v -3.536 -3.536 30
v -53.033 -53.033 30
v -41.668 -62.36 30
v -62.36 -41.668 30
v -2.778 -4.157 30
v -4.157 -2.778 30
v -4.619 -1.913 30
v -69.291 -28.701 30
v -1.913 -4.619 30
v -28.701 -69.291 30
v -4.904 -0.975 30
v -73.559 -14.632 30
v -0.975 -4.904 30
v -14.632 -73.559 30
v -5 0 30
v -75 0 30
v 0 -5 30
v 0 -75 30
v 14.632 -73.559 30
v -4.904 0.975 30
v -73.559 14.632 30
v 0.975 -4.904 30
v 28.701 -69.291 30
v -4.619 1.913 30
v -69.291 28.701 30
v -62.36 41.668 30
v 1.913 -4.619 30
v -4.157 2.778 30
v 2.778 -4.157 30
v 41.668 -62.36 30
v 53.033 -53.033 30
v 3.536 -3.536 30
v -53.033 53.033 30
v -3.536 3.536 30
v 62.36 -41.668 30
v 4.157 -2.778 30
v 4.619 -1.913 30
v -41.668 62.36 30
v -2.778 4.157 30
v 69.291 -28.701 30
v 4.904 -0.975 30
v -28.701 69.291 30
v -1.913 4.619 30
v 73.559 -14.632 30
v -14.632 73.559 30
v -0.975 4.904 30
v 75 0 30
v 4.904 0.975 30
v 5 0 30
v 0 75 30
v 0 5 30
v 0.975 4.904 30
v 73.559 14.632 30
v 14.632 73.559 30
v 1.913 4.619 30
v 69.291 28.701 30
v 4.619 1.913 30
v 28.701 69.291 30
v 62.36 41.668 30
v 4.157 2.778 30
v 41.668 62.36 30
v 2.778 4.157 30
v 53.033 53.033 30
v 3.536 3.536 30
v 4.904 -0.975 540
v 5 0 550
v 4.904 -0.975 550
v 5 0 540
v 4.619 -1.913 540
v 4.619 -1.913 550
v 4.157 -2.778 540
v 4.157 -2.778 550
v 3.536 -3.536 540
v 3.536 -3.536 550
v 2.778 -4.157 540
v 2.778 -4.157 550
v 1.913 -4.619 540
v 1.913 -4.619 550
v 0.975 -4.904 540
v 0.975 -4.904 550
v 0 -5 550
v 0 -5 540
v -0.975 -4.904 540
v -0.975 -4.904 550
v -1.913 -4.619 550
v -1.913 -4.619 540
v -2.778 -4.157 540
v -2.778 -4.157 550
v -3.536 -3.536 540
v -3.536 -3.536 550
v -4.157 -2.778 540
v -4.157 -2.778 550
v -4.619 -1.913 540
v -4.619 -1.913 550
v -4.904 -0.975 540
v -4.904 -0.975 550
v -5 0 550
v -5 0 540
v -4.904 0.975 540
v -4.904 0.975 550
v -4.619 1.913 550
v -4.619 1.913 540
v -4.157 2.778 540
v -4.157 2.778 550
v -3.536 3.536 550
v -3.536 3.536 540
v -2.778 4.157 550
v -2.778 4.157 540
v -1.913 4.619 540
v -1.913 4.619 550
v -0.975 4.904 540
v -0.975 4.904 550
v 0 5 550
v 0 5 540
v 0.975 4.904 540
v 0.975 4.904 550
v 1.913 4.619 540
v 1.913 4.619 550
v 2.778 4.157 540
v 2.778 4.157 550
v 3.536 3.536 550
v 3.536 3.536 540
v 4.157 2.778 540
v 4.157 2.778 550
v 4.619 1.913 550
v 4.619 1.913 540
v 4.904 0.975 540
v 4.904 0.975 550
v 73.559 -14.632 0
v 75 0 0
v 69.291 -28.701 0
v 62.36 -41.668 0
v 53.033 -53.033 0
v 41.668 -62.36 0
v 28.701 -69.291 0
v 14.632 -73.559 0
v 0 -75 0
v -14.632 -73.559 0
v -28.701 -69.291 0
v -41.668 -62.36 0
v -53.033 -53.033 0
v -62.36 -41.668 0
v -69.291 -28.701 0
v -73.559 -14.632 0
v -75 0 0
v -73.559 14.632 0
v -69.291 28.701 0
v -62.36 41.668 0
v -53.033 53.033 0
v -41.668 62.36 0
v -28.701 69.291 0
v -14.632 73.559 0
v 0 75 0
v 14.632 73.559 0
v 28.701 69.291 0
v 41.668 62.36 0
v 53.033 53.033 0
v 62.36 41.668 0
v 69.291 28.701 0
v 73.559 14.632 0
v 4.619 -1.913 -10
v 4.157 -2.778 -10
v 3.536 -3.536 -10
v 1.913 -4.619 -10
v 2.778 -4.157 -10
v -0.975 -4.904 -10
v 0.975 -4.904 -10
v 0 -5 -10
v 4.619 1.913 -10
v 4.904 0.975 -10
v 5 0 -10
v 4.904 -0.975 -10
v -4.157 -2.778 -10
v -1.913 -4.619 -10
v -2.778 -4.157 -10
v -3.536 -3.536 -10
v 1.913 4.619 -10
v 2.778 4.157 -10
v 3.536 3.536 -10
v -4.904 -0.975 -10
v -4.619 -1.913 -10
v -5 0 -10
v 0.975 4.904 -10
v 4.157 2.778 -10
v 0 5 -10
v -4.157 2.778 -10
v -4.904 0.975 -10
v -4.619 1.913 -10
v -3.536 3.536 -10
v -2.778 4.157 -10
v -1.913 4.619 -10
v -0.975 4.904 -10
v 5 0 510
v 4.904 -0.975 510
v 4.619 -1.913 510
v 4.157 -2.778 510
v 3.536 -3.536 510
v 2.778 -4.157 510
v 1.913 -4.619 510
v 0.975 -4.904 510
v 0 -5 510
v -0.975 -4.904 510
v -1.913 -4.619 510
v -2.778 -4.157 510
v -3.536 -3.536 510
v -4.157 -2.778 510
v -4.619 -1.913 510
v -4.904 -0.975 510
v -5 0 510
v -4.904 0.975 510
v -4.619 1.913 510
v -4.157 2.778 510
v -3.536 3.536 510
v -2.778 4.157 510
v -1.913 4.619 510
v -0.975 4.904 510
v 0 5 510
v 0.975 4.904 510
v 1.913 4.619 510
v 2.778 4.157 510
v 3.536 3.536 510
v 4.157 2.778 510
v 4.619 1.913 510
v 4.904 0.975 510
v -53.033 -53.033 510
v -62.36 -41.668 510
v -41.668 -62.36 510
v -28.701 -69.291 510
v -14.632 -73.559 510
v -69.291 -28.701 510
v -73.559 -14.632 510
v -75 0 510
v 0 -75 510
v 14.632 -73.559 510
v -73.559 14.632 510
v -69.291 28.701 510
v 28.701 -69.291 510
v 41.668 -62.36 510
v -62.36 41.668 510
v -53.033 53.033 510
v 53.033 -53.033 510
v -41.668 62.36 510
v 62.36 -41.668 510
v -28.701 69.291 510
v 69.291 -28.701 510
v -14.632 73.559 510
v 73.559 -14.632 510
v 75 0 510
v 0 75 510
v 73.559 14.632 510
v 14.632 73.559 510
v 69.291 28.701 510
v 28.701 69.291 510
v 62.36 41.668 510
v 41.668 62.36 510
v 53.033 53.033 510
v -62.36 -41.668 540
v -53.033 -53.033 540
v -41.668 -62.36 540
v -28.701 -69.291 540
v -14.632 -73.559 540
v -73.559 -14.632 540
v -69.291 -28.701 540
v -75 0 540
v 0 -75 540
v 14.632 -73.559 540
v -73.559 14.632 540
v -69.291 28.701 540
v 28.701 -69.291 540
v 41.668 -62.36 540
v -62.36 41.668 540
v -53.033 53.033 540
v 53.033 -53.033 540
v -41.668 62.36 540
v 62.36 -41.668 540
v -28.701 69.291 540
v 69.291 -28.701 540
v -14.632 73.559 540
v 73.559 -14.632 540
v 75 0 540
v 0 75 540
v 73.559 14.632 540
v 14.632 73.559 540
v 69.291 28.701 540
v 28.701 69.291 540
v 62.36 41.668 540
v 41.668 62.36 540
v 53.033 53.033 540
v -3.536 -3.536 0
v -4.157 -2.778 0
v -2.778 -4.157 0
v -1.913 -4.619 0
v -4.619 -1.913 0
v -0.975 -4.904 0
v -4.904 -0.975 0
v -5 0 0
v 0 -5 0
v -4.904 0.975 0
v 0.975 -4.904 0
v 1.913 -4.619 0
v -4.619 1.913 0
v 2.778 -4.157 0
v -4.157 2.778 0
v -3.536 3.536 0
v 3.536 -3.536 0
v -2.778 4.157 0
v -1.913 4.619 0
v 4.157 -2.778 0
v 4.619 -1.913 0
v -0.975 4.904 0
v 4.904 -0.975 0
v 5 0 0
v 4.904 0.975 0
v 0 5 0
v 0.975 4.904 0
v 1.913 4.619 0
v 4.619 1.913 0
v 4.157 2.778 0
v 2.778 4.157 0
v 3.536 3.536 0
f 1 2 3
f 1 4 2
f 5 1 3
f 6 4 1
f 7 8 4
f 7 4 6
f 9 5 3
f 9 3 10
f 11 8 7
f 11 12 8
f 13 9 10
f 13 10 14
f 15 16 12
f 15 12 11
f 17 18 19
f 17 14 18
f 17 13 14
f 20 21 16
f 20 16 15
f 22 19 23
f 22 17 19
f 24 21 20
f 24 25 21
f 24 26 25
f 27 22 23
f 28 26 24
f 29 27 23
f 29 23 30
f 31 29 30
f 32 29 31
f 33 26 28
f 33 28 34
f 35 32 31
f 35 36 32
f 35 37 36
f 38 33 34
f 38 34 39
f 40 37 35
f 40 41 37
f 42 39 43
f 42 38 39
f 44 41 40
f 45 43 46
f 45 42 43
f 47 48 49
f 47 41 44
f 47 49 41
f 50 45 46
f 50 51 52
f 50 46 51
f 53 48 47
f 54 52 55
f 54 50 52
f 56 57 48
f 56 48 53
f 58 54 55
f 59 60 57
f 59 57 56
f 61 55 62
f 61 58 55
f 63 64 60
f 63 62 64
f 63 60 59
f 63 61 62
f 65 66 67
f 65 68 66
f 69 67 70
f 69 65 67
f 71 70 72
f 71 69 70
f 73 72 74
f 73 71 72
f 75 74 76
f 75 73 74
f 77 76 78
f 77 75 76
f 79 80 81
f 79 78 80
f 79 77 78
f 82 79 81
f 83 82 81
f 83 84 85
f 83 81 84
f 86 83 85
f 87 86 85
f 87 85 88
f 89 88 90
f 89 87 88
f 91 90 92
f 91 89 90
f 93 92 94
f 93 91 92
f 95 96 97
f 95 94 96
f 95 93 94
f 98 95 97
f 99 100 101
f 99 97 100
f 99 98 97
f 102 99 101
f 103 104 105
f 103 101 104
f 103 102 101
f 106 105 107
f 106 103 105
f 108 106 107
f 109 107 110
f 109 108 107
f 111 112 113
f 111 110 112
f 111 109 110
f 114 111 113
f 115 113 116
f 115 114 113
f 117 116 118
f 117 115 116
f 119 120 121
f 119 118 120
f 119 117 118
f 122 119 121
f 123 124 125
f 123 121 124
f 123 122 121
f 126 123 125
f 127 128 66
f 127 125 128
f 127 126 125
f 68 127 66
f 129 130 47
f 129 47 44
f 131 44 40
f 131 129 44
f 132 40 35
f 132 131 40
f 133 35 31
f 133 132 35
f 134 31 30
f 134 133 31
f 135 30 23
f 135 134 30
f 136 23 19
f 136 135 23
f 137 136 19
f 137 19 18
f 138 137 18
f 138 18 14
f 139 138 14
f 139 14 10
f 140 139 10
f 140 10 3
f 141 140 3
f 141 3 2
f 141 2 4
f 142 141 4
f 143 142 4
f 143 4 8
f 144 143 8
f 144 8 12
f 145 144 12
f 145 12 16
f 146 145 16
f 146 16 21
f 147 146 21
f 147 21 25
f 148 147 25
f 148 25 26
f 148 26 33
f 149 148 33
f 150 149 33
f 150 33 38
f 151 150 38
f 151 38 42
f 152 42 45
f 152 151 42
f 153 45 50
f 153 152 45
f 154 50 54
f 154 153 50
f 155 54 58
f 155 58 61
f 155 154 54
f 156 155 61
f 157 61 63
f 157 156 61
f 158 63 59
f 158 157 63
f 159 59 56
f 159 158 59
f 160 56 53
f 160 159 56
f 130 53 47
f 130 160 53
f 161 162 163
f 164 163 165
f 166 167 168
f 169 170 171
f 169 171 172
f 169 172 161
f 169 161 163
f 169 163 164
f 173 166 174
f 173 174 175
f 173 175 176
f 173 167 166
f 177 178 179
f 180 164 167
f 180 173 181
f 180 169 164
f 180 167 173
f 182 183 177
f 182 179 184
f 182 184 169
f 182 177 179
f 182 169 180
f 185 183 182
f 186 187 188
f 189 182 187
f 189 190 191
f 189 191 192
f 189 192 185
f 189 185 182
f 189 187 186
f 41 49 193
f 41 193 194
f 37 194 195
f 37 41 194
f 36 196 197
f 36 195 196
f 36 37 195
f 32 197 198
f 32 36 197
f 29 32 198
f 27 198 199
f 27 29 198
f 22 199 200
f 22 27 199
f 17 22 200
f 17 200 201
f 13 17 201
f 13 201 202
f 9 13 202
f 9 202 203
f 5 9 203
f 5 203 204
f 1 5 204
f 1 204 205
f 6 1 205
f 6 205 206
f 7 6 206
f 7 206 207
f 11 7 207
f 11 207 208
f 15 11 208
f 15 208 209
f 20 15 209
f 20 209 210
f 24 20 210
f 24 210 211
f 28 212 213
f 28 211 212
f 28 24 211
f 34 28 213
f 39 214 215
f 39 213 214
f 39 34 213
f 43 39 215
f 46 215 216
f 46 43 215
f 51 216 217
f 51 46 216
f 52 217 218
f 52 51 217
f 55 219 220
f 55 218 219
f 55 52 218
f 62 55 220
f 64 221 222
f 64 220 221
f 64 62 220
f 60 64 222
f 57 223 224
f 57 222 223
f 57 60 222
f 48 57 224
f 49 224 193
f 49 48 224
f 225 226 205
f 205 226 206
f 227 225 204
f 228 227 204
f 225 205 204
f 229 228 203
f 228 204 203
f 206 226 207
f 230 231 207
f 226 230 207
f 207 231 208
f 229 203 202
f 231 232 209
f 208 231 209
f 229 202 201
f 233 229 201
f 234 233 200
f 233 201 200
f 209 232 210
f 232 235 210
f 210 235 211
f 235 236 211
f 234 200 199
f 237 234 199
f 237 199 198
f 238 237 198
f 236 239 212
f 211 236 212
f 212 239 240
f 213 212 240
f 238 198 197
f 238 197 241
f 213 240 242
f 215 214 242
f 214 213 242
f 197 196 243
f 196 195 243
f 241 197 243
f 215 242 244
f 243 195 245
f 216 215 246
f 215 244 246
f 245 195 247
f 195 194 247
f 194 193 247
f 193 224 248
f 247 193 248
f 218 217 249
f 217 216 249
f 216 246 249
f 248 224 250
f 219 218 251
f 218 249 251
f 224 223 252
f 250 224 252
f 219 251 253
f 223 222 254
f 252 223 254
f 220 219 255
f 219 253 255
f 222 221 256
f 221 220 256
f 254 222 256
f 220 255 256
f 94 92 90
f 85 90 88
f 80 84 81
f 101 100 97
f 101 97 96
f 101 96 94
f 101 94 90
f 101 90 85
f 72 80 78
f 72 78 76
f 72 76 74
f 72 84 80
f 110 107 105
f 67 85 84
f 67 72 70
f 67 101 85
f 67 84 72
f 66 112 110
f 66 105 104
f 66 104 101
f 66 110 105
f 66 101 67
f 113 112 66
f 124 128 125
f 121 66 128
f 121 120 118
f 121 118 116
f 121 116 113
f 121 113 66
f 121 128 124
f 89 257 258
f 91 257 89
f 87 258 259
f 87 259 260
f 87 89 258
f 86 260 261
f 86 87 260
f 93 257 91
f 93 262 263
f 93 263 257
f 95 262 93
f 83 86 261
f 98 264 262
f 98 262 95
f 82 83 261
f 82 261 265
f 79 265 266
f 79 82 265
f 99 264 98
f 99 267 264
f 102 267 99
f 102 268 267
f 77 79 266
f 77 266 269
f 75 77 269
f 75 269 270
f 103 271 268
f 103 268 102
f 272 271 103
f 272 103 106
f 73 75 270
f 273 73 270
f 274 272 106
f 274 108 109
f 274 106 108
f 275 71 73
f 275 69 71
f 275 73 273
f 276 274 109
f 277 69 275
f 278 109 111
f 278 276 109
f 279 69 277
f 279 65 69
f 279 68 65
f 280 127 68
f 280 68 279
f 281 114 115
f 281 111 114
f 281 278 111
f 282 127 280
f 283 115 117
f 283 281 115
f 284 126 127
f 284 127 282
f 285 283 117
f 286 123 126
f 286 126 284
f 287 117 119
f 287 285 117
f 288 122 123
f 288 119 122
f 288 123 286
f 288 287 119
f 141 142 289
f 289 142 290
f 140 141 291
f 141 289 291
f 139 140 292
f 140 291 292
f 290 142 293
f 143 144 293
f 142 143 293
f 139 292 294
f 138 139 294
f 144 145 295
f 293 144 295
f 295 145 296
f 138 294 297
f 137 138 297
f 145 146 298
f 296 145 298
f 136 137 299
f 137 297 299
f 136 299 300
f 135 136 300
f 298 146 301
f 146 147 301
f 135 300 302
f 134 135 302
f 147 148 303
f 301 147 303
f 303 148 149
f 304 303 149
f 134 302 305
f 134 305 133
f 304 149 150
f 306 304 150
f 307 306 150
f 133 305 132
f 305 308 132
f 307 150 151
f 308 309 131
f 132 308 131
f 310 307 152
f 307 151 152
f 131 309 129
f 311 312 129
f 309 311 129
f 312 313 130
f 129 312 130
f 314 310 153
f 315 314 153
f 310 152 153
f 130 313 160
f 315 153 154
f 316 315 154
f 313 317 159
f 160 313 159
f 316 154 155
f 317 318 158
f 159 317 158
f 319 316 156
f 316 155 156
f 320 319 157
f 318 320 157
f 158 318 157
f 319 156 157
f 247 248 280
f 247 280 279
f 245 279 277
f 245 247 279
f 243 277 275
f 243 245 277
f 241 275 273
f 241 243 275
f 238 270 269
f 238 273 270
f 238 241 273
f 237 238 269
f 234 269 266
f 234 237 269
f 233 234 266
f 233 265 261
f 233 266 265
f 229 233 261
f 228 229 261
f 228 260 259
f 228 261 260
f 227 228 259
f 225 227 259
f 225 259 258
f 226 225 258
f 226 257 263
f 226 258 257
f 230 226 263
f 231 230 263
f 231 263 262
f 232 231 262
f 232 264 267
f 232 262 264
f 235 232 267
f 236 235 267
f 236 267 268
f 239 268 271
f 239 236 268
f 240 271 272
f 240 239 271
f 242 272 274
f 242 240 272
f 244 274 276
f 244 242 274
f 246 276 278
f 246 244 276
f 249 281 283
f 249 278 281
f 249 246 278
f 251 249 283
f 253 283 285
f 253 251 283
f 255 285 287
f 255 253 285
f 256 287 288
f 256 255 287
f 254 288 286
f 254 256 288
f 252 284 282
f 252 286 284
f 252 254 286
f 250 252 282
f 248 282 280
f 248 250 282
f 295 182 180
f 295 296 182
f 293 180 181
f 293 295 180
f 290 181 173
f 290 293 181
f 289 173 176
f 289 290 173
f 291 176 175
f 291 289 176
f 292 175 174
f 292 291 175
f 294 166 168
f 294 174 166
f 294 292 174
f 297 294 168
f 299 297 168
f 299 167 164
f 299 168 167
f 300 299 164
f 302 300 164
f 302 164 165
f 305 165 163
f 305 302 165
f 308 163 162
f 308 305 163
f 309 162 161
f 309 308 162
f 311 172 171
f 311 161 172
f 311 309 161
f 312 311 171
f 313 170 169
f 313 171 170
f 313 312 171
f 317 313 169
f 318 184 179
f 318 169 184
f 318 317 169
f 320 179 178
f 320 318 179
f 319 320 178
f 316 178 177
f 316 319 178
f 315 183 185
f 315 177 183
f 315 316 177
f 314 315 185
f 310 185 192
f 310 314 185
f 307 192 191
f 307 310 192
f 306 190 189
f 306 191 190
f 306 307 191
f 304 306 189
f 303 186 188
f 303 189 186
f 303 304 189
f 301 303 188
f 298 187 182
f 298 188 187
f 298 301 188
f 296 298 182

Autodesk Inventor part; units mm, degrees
ref_plane "YZ Plane" through (0, 0, 0) normal (1, 0, 0) x (0, 1, 0)
ref_plane "XZ Plane" through (0, 0, 0) normal (0, 1, 0) x (-1, 0, 0)
ref_plane "XY Plane" through (0, 0, 0) normal (0, 0, 1) x (1, 0, 0)
sketch "Skizze1" plane through (0, 0, 0) normal (0, 0, 1) x (1, 0, 0)
  line L0 (-105, 0) -> (105, 0) projected
  line L1 (0, -105) -> (0, 105) projected
  circle A0 centre (0, 0) radius 75
  dimension "d0" = 150
extrude "Extrusion1" add sketch "Skizze1" along normal blind 30
sketch "Skizze2" plane through (0, 0, 30) normal (0, 0, 1) x (1, 0, 0)
  circle A0 centre (0, 0) radius 5
  dimension "d3" = 10
extrude "Extrusion2" add sketch "Skizze2" along normal blind 480
sketch "Skizze3" plane through (0, 0, 510) normal (0, 0, 1) x (1, 0, 0)
  circle A0 centre (0, 0) radius 5 projected
  circle A1 centre (0, 0) radius 75
extrude "Extrusion3" add sketch "Skizze3" along normal blind 30
sketch "Skizze4" plane through (0, 0, 0) normal (0, 0, -1) x (-1, 0, 0)
  circle A0 centre (0, 0) radius 5 projected
  circle A1 centre (0, 0) radius 5
  dimension "d8" = 10
extrude "Extrusion4" add sketch "Skizze4" along normal blind 10
sketch "Skizze5" plane through (0, 0, 510) normal (0, 0, 1) x (1, 0, 0)
  circle A0 centre (0, 0) radius 5
  dimension "d11" = 10
extrude "Extrusion5" add sketch "Skizze5" along normal blind 40
properties part number "Reifen"
